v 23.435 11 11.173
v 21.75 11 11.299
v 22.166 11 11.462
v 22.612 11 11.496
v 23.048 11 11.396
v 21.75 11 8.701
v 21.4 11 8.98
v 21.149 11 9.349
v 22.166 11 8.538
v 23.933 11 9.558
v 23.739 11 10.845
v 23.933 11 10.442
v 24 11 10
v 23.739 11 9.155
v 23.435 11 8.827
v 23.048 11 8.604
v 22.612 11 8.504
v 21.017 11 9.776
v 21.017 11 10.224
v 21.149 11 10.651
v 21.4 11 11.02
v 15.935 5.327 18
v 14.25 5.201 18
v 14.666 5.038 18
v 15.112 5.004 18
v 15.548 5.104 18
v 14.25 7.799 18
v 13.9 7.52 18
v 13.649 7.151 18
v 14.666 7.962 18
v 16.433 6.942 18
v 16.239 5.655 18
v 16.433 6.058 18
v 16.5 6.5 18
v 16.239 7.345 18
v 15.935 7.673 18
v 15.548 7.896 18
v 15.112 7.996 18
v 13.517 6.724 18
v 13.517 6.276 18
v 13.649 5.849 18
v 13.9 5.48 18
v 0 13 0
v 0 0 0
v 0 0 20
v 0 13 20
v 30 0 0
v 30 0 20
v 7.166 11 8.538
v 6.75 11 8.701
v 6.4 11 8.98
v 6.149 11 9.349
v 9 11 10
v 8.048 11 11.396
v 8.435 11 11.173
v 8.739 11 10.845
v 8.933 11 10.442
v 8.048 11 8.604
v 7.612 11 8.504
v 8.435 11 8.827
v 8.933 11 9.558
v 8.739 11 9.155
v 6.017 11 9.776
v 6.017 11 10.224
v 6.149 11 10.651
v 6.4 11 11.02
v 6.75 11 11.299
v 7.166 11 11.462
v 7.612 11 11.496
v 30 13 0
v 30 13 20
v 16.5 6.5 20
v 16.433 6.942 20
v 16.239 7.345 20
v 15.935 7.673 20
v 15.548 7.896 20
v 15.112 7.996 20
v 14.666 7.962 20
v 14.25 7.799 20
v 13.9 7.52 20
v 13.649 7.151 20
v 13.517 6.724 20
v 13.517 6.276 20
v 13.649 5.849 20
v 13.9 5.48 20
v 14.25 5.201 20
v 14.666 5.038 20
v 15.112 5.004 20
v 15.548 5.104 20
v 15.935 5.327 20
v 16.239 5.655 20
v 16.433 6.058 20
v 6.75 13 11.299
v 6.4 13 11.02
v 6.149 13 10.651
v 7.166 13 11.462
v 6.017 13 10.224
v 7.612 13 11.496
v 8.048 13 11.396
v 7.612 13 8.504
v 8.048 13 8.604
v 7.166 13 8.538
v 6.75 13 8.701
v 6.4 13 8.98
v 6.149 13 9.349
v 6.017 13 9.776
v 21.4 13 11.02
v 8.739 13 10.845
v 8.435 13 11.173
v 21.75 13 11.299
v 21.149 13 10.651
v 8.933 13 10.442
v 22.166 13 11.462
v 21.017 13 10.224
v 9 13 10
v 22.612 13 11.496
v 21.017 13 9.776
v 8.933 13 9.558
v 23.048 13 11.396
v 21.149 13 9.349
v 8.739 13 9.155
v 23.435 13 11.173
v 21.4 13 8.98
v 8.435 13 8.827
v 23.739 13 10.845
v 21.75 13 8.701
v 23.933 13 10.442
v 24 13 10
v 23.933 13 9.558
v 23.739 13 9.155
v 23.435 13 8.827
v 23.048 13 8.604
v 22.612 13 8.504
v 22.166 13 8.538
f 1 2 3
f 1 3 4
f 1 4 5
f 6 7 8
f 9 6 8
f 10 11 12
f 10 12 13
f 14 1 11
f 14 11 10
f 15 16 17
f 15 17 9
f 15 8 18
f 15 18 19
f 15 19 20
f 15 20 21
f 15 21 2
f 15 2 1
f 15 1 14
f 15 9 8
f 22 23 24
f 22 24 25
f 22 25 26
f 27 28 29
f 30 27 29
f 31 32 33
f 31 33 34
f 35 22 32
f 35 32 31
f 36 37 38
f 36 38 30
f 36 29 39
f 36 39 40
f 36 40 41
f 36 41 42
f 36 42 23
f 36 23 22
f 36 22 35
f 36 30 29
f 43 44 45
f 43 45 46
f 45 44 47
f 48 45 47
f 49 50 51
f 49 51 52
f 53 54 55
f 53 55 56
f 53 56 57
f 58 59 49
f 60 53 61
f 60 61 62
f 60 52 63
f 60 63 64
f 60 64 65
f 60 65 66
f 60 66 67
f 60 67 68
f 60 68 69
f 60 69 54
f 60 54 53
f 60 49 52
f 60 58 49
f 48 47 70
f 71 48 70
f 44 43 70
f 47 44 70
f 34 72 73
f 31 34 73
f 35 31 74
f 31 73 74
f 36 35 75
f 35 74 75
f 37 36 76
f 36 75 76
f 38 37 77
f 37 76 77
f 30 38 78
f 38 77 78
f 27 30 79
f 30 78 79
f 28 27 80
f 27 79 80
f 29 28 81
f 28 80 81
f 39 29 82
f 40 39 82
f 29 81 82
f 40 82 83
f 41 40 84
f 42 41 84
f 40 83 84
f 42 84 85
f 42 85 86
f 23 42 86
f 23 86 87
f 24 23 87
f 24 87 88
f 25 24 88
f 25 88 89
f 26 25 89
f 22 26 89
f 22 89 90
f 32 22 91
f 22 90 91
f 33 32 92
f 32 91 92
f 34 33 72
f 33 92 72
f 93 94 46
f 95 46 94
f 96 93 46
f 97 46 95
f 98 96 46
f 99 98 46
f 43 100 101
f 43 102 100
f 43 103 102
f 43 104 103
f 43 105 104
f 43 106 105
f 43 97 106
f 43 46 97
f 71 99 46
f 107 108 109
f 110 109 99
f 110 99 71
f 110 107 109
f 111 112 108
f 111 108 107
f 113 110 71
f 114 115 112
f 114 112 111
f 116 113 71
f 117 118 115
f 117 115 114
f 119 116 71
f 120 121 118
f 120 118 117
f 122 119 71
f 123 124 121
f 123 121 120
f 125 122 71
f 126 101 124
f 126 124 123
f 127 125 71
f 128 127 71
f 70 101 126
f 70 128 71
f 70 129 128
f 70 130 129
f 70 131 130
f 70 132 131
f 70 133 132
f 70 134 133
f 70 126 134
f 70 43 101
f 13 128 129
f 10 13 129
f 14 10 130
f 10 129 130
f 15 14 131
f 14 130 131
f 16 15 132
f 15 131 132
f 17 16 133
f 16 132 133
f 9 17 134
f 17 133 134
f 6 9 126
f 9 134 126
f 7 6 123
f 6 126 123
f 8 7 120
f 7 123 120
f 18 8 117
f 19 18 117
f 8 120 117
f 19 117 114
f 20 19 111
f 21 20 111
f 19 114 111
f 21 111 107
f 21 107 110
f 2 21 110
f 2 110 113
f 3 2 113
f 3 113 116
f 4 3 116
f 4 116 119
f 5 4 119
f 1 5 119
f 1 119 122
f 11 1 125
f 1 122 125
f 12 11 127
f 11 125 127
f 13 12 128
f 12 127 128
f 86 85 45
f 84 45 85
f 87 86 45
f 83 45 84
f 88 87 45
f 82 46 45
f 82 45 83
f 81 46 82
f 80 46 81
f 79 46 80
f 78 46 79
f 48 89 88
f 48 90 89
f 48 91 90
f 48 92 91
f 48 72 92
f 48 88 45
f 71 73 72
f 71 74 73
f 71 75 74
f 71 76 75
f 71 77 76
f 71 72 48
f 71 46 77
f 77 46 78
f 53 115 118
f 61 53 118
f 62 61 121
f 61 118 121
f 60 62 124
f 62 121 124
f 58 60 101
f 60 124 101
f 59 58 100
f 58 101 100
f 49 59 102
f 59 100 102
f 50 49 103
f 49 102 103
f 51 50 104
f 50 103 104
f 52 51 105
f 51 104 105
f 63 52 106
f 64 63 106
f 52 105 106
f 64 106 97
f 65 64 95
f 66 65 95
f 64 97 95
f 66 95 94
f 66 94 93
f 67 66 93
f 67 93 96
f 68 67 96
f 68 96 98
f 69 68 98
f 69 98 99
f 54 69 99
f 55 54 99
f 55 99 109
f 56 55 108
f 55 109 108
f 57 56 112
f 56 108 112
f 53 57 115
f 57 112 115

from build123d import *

# Parameters (mm, degrees)
SKETCH1_W           = 30
SKETCH1_H           = 13
BOSS_EXTRUDE1_DEPTH = 20
SKETCH2_R           = 1.5
CUT_EXTRUDE1_DEPTH  = 2
SKETCH3_R           = 1.5
CUT_EXTRUDE2_DEPTH  = 2


with BuildPart() as part:
    # Sketch1 → Boss-Extrude1 (new body)
    with BuildSketch(Plane.XY):
        with Locations((15, 6.5)):
            Rectangle(SKETCH1_W, SKETCH1_H)
    extrude(amount=BOSS_EXTRUDE1_DEPTH)

    # Sketch2 → Cut-Extrude1 (cut)
    with BuildSketch(Plane.XY.offset(20)):
        with Locations((15, 6.5)):
            Circle(SKETCH2_R)
    extrude(amount=-CUT_EXTRUDE1_DEPTH, mode=Mode.SUBTRACT)

    # Sketch3 → Cut-Extrude2 (cut)
    with BuildSketch(Plane(origin=(0, 13, 0), x_dir=(1, 0, 0), z_dir=(0, 1, 0))):
        with Locations((7.5, -10)):
            Circle(SKETCH3_R)
        with Locations((22.5, -10)):
            Circle(SKETCH3_R)
    extrude(amount=-CUT_EXTRUDE2_DEPTH, mode=Mode.SUBTRACT)


solid = part.part
